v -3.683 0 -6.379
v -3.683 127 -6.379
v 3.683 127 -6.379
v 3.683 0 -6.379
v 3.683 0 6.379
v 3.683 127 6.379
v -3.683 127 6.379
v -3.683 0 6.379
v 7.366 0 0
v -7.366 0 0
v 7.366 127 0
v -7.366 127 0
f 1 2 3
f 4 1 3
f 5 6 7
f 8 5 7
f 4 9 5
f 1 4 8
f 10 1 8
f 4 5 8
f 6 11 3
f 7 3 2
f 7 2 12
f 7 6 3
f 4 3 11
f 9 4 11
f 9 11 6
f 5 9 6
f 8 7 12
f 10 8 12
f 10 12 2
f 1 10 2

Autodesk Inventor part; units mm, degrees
ref_plane "YZ Plane" through (0, 0, 0) normal (1, 0, 0) x (0, 1, 0)
ref_plane "XZ Plane" through (0, 0, 0) normal (0, 1, 0) x (-1, 0, 0)
ref_plane "XY Plane" through (0, 0, 0) normal (0, 0, 1) x (1, 0, 0)
sketch "Sketch1" plane through (0, 0, 0) normal (0, 1, 0) x (-1, 0, 0)
  line L0 (0, 0) -> (7.366, 0) construction
  line L1 (7.366, 0) -> (3.683, -6.3791)
  line L2 (3.683, -6.3791) -> (-3.683, -6.3791)
  line L3 (-3.683, -6.3791) -> (-7.366, 0)
  line L4 (-7.366, 0) -> (-3.683, 6.3791)
  line L5 (-3.683, 6.3791) -> (3.683, 6.3791)
  line L6 (3.683, 6.3791) -> (7.366, 0)
  dimension "d3" = 7.366
extrude "Extrusion1" add sketch "Sketch1" along normal blind 127
properties part number "hex shaft for wheels"
